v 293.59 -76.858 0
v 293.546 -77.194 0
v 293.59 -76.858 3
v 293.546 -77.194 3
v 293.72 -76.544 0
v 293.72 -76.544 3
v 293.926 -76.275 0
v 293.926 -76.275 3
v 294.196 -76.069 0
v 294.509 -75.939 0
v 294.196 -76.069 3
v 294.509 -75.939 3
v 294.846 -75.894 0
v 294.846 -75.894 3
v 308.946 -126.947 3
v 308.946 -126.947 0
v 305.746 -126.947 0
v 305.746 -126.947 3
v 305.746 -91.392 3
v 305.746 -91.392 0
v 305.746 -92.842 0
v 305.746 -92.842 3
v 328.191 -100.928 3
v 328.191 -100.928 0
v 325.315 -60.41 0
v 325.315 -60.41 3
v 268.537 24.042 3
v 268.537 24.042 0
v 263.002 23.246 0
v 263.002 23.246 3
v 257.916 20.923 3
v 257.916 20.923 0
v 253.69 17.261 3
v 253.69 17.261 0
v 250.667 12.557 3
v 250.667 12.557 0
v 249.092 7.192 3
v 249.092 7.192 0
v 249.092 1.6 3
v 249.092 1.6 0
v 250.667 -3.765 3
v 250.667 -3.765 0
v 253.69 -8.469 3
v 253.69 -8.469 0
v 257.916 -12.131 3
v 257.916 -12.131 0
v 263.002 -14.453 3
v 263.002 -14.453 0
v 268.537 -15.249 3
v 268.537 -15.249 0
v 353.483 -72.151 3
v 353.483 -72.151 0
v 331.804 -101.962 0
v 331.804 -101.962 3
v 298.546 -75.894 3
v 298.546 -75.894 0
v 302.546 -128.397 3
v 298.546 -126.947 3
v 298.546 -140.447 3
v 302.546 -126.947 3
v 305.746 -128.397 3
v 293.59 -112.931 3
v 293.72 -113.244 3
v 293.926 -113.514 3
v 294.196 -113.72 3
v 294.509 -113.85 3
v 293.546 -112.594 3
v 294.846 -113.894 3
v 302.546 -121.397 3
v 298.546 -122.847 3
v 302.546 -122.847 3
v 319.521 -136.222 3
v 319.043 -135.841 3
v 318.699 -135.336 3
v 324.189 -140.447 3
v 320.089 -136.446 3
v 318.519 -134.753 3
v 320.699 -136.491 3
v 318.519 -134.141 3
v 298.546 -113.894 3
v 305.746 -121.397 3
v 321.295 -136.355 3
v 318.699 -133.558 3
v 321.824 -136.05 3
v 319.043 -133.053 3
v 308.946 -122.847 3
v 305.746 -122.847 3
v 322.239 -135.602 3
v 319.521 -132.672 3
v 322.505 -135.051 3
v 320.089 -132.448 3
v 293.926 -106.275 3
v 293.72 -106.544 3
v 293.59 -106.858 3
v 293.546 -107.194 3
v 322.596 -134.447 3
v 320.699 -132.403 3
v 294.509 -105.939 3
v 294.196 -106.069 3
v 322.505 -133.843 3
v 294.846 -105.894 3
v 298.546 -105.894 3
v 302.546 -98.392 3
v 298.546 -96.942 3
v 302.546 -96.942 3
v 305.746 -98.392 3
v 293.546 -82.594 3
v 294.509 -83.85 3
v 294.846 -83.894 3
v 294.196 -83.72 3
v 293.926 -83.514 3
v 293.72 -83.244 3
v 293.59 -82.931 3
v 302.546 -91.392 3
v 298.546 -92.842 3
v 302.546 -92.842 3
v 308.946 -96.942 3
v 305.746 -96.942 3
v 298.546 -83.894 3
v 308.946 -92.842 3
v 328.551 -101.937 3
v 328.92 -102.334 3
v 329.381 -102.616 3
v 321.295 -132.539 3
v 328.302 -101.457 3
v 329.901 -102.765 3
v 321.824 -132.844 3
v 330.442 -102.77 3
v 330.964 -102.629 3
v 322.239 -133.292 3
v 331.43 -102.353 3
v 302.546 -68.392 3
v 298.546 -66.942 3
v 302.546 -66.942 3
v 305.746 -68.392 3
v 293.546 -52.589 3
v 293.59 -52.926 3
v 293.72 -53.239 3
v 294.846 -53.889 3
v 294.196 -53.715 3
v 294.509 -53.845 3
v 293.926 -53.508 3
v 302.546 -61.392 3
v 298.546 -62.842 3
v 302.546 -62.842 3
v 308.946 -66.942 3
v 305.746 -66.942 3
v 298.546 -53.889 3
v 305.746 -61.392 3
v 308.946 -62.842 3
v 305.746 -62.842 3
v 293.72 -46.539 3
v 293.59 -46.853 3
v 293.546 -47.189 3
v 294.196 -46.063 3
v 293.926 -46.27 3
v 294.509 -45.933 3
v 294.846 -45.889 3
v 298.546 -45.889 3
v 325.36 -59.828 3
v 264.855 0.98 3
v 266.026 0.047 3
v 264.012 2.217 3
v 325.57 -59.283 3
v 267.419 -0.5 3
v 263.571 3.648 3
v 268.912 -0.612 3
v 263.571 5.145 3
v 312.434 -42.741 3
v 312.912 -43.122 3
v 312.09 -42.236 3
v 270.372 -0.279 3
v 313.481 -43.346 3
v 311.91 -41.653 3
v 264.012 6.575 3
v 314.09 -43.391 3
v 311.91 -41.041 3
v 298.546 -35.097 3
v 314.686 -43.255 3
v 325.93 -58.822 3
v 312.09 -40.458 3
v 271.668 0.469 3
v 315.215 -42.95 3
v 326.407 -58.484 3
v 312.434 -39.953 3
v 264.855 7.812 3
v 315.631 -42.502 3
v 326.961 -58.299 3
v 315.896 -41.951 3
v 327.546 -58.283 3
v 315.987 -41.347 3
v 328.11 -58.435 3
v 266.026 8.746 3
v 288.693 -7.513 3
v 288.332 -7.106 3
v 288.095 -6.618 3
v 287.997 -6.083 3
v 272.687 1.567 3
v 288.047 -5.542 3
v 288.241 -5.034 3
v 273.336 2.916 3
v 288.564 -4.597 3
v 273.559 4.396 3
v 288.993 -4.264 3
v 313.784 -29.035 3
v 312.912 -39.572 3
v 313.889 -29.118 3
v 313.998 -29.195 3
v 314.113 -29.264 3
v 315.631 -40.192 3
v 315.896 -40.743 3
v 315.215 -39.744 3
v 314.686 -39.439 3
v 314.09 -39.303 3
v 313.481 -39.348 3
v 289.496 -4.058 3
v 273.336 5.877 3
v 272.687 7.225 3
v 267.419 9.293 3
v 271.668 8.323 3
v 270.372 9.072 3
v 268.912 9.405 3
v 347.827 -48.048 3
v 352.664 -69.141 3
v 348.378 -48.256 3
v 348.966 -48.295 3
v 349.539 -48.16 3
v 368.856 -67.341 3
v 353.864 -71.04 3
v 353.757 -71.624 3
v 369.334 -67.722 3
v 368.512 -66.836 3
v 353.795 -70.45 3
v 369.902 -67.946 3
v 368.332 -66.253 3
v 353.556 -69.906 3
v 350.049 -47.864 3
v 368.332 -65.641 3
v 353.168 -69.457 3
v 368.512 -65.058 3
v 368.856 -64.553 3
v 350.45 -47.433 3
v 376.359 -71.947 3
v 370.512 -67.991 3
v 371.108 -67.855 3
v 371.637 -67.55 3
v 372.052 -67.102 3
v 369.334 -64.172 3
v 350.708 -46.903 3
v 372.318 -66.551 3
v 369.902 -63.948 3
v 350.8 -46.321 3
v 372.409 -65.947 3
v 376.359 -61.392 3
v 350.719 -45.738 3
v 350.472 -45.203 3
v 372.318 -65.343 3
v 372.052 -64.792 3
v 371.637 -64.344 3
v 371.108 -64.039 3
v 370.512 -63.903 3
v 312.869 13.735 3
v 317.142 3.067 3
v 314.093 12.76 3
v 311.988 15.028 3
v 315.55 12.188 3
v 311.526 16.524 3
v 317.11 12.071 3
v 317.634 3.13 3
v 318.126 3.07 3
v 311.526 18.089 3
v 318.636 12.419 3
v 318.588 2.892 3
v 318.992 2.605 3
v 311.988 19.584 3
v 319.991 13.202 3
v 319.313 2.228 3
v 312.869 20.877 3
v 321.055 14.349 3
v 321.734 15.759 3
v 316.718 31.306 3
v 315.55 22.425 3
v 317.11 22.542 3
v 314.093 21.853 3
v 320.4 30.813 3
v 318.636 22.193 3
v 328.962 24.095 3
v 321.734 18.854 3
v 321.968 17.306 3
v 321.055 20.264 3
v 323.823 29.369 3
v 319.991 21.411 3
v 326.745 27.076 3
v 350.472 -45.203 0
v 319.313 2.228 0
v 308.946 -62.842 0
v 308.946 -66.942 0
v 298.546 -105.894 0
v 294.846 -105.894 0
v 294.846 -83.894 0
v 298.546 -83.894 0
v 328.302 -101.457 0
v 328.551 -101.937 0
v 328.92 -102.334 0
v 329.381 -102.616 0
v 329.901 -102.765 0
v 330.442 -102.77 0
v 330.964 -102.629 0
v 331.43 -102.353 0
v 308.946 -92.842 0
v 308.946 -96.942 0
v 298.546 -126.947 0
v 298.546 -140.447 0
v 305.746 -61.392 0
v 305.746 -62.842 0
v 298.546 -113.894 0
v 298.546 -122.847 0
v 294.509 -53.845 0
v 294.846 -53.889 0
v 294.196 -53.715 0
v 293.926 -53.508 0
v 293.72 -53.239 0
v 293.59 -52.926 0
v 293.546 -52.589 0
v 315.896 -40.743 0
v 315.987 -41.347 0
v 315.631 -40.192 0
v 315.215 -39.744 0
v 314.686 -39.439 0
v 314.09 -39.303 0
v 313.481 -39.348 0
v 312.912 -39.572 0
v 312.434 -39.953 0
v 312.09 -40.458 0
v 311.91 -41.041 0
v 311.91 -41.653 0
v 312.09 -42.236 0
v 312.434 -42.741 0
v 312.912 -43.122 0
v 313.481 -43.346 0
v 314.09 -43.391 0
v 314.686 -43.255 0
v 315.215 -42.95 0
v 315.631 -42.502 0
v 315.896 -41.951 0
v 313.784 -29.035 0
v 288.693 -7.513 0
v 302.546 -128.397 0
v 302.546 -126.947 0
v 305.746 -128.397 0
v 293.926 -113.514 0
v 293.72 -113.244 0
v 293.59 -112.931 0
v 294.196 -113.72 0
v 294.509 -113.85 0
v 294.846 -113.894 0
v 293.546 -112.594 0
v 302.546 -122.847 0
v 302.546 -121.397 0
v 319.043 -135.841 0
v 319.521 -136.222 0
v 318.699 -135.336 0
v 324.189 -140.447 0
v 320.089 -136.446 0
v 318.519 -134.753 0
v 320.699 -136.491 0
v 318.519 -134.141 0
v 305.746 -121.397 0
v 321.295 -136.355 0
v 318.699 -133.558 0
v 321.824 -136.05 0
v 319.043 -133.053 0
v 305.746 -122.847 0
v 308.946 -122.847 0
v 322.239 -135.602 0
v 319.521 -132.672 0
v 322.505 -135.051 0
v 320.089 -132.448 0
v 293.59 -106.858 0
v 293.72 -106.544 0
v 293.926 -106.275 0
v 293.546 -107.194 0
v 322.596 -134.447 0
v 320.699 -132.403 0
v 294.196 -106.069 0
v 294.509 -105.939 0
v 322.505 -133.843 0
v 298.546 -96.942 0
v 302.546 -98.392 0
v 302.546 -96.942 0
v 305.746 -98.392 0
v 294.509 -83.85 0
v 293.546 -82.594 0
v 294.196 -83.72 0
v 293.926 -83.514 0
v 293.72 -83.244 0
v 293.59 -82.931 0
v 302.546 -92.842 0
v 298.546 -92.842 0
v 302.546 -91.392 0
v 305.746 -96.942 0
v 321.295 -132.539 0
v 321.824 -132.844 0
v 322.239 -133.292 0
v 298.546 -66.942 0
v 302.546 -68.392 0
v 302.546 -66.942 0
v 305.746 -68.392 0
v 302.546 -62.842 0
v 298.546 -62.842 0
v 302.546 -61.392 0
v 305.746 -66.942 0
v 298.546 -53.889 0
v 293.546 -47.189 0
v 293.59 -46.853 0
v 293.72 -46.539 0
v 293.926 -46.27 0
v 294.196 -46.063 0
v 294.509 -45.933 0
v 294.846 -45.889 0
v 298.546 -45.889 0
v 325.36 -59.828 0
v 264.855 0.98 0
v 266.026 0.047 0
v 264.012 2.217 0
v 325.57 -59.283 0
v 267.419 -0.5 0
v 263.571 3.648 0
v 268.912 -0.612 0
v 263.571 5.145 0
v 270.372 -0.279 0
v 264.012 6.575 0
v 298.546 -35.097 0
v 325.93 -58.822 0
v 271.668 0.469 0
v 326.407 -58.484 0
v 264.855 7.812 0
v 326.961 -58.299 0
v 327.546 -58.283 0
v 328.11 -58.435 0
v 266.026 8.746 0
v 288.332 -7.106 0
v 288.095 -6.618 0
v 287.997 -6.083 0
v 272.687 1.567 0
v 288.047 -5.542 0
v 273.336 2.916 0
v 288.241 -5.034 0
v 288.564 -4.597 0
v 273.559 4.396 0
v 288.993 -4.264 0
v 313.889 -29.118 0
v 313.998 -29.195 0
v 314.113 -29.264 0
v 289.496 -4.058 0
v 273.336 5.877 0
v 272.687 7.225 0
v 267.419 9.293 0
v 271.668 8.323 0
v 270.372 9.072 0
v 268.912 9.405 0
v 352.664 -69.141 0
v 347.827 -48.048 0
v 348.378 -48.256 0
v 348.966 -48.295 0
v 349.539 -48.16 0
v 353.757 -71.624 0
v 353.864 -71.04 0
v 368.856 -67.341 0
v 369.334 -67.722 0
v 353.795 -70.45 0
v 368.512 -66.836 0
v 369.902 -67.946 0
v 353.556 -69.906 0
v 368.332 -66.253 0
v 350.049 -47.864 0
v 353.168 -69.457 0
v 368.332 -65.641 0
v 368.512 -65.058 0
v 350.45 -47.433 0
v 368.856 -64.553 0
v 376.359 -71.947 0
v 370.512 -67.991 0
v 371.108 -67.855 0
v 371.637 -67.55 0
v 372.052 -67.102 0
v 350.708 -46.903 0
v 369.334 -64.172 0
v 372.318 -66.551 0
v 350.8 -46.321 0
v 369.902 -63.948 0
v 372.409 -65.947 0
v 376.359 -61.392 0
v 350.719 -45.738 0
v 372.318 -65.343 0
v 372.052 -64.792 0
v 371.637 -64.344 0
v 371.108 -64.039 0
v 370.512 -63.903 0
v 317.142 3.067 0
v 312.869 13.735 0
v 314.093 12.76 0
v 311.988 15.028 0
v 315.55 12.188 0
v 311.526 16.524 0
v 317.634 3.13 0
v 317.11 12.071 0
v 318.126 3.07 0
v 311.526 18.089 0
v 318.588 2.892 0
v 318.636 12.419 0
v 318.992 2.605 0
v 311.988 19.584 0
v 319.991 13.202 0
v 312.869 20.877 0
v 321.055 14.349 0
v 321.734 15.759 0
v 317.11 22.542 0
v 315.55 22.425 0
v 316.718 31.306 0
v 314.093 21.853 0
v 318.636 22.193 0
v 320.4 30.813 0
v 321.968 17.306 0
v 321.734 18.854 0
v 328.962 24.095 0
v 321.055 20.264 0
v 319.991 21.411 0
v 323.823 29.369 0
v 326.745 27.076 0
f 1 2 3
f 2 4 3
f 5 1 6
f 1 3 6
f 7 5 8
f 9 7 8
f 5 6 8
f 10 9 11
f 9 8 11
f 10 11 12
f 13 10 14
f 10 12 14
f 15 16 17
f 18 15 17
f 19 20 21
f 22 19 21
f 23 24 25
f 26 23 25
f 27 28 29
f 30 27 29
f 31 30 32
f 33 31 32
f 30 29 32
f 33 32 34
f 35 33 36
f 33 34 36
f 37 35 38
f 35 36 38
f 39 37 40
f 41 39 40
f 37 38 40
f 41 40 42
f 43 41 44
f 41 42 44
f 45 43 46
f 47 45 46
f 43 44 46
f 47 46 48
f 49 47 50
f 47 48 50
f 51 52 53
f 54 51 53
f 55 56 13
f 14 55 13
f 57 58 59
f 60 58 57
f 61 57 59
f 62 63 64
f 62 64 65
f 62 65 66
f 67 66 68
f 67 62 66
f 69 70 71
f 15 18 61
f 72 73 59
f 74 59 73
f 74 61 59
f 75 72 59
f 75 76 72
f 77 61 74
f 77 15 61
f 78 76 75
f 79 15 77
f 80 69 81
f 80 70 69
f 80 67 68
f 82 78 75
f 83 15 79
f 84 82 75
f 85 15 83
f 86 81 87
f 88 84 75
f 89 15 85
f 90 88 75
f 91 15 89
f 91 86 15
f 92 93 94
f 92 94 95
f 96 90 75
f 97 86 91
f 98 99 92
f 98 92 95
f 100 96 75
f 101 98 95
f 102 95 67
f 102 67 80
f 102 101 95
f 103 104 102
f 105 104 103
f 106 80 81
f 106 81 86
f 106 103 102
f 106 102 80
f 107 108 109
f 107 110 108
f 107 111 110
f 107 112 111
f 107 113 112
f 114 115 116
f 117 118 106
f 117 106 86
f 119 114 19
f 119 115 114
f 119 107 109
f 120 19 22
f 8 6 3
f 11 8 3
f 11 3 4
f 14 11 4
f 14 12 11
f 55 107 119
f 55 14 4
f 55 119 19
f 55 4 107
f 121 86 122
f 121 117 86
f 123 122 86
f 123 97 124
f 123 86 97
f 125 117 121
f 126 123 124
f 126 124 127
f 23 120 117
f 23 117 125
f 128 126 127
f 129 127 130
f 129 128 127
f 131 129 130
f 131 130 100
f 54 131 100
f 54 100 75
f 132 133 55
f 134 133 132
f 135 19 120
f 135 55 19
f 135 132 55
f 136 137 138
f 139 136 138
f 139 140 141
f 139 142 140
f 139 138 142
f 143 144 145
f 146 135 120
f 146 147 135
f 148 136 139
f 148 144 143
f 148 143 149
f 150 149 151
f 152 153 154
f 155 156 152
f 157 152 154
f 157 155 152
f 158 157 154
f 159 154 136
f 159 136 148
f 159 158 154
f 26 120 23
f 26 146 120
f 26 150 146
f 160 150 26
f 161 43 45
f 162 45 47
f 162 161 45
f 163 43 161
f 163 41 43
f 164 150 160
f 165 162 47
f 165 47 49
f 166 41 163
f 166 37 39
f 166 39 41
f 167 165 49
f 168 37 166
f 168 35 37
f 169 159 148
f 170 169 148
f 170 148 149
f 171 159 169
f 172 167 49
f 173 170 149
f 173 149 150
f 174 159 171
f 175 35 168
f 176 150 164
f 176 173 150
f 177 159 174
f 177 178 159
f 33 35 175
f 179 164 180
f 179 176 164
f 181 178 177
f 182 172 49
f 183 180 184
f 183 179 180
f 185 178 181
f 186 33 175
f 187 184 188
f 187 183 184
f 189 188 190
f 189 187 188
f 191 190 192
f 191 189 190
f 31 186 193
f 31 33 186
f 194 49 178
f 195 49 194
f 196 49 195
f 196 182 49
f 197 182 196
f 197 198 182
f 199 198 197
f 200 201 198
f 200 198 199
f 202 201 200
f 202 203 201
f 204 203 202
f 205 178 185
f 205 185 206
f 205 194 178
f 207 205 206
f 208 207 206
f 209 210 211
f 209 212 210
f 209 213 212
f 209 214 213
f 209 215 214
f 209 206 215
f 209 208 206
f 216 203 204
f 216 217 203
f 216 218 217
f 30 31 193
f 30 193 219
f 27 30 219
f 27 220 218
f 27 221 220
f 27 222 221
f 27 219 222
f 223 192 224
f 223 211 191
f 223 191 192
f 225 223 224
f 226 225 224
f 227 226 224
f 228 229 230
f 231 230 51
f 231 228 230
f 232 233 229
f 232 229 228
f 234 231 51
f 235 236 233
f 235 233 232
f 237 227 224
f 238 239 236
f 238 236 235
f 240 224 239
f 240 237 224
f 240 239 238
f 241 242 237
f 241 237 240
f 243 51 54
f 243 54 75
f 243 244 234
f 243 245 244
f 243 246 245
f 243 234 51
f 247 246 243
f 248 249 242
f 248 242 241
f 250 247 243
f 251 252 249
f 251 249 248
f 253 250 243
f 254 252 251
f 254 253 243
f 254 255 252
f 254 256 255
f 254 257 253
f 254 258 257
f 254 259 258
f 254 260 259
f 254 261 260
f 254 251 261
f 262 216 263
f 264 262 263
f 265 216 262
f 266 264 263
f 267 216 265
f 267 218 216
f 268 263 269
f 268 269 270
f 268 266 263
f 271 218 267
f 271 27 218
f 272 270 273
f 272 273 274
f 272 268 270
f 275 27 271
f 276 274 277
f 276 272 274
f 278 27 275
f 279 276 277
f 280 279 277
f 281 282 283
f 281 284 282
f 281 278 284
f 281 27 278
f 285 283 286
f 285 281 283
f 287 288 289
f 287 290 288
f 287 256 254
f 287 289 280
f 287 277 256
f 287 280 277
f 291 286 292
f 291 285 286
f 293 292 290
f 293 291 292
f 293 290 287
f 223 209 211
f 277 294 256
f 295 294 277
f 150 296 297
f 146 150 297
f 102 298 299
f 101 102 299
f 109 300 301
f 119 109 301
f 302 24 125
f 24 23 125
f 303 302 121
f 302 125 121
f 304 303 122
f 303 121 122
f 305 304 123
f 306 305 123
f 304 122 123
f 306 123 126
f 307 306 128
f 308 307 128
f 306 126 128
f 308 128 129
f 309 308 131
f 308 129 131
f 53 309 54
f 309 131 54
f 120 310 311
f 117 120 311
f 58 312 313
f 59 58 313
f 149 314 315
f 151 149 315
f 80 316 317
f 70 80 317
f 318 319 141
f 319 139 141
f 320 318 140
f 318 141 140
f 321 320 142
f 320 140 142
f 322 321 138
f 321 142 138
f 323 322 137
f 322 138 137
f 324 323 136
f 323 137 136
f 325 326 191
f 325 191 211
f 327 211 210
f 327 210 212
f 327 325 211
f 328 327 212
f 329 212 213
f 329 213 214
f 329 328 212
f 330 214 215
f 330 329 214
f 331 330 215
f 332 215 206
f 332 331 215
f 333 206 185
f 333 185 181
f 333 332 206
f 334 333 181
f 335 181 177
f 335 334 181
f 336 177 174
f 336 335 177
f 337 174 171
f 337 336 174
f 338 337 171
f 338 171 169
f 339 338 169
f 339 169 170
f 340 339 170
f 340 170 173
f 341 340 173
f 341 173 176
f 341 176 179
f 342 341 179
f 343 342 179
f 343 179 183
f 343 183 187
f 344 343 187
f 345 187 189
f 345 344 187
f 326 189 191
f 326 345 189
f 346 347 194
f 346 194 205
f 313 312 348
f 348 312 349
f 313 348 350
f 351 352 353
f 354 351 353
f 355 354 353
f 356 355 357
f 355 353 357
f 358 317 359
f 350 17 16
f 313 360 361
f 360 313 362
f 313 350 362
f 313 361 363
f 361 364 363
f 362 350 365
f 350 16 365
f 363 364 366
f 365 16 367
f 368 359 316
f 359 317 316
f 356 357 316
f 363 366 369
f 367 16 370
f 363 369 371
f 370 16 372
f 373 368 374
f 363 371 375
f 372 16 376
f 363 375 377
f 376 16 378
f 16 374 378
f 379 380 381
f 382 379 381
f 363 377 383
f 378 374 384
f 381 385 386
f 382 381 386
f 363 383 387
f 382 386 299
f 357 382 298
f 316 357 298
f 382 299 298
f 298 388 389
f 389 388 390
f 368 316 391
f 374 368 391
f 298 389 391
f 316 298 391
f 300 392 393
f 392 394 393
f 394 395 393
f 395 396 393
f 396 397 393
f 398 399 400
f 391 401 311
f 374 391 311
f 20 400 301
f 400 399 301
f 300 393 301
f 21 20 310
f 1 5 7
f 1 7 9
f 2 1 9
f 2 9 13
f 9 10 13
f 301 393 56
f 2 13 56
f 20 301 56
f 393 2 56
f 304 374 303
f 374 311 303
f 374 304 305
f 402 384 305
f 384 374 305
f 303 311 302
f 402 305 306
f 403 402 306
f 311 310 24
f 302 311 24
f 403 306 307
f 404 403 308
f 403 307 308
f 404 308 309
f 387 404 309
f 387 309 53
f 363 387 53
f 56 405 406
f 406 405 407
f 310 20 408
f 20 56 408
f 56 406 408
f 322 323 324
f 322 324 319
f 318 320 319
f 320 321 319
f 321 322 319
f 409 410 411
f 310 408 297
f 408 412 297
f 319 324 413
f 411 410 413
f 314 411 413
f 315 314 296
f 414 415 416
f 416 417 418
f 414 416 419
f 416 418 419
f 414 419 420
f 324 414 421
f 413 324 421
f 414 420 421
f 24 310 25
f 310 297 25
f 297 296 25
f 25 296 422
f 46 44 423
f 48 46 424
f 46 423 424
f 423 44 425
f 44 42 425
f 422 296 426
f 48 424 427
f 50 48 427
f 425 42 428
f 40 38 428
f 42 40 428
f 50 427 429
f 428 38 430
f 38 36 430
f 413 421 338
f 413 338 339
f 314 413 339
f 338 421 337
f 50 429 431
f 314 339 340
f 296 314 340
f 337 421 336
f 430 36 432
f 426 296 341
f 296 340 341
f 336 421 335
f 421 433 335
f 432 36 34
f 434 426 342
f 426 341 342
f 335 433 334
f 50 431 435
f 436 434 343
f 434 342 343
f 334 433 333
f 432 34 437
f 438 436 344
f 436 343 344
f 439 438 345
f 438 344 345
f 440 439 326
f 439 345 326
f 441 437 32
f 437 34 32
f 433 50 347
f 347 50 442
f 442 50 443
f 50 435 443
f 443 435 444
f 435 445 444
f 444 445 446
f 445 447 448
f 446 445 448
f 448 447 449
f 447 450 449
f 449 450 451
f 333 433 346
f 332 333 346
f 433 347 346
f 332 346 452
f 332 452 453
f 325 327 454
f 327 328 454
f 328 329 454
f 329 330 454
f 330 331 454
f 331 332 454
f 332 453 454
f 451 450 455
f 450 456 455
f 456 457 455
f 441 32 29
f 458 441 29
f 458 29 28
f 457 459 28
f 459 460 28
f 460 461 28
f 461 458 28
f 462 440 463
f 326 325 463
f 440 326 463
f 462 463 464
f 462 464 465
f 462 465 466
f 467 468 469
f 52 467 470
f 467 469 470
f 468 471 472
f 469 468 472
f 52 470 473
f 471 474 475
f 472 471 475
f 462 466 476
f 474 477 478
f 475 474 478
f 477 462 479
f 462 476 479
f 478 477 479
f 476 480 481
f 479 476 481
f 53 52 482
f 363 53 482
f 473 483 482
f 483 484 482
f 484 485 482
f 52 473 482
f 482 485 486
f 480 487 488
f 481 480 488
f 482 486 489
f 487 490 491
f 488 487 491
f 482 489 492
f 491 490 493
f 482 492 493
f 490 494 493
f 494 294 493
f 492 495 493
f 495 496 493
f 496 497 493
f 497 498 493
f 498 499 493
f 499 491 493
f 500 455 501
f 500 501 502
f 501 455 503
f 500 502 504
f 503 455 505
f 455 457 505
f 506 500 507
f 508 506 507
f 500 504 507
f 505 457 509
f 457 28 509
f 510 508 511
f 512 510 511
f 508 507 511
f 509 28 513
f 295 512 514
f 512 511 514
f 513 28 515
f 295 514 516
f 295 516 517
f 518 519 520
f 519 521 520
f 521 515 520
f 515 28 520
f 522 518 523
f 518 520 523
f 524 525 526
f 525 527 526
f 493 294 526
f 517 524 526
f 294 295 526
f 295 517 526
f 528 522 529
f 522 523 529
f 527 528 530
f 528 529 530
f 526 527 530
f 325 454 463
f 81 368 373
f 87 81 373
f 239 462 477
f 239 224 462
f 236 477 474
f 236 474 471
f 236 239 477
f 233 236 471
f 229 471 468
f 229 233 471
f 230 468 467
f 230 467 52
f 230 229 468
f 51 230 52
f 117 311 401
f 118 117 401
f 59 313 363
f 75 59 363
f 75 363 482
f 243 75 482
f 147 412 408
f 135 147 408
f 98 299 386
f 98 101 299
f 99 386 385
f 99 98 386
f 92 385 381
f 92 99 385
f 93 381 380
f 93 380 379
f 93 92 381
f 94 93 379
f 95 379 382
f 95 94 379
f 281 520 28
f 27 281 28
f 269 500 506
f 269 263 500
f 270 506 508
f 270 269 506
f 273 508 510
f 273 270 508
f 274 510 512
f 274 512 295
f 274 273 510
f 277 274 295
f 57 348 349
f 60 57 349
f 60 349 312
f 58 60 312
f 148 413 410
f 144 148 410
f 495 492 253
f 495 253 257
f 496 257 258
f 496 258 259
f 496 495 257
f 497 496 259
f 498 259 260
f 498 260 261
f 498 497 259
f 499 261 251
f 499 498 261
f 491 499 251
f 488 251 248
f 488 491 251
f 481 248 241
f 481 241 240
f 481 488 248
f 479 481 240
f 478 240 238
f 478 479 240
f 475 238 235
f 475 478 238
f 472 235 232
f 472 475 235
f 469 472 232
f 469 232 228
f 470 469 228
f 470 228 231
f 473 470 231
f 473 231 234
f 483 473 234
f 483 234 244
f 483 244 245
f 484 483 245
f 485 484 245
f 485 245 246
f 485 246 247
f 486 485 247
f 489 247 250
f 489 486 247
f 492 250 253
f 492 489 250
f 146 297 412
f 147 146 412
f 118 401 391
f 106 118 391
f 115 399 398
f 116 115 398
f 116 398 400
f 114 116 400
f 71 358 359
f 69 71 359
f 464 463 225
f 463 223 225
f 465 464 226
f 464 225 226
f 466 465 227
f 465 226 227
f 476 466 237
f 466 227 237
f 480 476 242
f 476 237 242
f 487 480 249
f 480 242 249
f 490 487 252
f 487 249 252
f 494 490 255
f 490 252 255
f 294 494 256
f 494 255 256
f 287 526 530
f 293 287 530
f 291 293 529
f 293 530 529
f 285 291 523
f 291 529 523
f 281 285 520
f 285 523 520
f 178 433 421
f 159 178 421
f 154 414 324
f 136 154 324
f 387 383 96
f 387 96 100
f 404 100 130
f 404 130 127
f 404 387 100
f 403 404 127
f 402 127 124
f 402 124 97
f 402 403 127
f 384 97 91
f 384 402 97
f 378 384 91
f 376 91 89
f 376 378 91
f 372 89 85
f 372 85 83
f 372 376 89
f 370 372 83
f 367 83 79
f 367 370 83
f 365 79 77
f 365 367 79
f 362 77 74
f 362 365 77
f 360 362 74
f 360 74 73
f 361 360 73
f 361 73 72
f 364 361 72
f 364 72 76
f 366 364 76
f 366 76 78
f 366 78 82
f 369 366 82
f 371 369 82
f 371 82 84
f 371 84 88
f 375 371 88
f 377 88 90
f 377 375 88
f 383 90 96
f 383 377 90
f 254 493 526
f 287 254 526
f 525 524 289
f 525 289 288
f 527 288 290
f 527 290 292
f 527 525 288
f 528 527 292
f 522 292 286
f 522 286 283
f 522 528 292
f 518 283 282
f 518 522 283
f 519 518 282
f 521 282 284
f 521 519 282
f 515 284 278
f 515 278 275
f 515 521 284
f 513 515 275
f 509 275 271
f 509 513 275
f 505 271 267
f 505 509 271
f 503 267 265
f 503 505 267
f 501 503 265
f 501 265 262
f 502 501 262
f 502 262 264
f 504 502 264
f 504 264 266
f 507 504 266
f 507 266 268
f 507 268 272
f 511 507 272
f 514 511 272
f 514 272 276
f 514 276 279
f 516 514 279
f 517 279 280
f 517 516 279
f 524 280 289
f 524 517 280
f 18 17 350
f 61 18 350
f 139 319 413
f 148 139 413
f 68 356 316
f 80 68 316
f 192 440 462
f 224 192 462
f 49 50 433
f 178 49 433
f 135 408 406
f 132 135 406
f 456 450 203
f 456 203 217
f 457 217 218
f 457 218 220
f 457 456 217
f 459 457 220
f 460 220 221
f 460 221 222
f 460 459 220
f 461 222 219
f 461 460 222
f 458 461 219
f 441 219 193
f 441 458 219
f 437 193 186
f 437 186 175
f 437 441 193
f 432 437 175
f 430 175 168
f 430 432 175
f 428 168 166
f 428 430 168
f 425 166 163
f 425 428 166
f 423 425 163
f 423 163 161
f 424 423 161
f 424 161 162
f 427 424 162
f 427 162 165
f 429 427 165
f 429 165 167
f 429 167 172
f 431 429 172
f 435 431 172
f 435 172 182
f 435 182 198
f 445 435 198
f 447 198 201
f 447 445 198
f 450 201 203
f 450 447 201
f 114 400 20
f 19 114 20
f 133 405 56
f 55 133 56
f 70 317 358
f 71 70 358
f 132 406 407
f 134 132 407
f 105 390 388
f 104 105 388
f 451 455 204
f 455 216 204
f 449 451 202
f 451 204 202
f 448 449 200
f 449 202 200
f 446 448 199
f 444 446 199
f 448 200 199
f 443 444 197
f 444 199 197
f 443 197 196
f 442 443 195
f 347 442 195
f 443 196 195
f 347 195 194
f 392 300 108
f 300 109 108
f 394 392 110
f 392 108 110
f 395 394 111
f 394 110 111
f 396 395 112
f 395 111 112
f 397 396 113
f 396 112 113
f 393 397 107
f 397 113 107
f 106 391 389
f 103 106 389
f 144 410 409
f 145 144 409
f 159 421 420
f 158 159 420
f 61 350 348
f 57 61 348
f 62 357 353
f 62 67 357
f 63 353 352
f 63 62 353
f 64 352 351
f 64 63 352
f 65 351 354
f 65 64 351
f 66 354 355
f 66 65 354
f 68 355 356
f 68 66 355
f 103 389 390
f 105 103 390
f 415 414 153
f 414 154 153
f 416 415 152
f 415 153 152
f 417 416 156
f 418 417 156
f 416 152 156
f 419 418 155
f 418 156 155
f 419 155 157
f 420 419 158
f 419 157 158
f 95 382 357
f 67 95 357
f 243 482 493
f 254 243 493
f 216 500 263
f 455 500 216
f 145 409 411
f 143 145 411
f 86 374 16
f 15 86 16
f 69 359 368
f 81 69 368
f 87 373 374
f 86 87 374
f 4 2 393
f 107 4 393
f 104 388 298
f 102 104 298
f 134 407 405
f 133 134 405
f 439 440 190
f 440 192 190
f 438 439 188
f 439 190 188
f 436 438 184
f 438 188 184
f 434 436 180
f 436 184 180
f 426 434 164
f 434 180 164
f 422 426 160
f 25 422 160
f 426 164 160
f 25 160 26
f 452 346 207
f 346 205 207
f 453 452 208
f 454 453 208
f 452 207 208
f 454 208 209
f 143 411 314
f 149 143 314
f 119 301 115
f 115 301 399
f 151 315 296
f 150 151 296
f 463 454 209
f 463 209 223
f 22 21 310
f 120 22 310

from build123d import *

# Parameters (mm, degrees)
SKETCH_1_R      = 5.0225
SKETCH_1_R_2    = 2.05
SKETCH_1_R_3    = 5.25
EXTRUDE_1_DEPTH = 3
FILLET_1_R      = 2
FILLET_2_R      = 1.3


with BuildPart() as part:
    # 草图1 → 凸台-拉伸1 (new body)
    with BuildSketch(Plane.XY):
        with BuildLine():
            Line((298.545628784, -83.894391363), (298.545628784, -92.841778663))
            Line((298.545628784, -92.841778663), (302.545628784, -92.841778663))
            Line((302.545628784, -92.841778663), (302.545628784, -91.391778663))
            Line((302.545628784, -91.391778663), (305.745628784, -91.391778663))
            Line((305.745628784, -91.391778663), (305.745628784, -92.841778663))
            Line((305.745628784, -92.841778663), (308.945628784, -92.841778663))
            Line((308.945628784, -92.841778663), (308.945628784, -96.941778663))
            Line((308.945628784, -96.941778663), (305.745628784, -96.941778663))
            Line((305.745628784, -96.941778663), (305.745628784, -98.391778663))
            Line((305.745628784, -98.391778663), (302.545628784, -98.391778663))
            Line((302.545628784, -98.391778663), (302.545628784, -96.941778663))
            Line((302.545628784, -96.941778663), (298.545628784, -96.941778663))
            Line((298.545628784, -96.941778663), (298.545628784, -105.894391358))
            Line((298.545628784, -105.894391358), (293.545628784, -105.894391358))
            Line((293.545628784, -105.894391358), (293.545628784, -113.894391358))
            Line((293.545628784, -113.894391358), (298.545628784, -113.894391358))
            Line((298.545628784, -113.894391358), (298.545628784, -122.847004054))
            Line((298.545628784, -122.847004054), (302.545628784, -122.847004054))
            Line((302.545628784, -122.847004054), (302.545628784, -121.397004054))
            Line((302.545628784, -121.397004054), (305.745628784, -121.397004054))
            Line((305.745628784, -121.397004054), (305.745628784, -122.847004054))
            Line((305.745628784, -122.847004054), (308.945628784, -122.847004054))
            Line((308.945628784, -122.847004054), (308.945628784, -126.947004054))
            Line((308.945628784, -126.947004054), (305.745628784, -126.947004054))
            Line((305.745628784, -126.947004054), (305.745628784, -128.397004054))
            Line((305.745628784, -128.397004054), (302.545628784, -128.397004054))
            Line((302.545628784, -128.397004054), (302.545628784, -126.947004054))
            Line((302.545628784, -126.947004054), (298.545628784, -126.947004054))
            Line((298.545628784, -126.947004054), (298.545628784, -140.447004054))
            Line((298.545628784, -140.447004054), (324.188862368, -140.447004054))
            Line((324.188862368, -140.447004054), (376.358604426, -71.946984141))
            Line((376.358604426, -71.946984141), (376.358604426, -61.391778668))
            Line((376.358604426, -61.391778668), (328.961754808, 24.094724856))
            ThreePointArc((328.961754808, 24.094724856), (323.822689813, 29.369350164), (316.717741365, 31.306195206))
            Line((316.717741365, 31.306195206), (268.536959304, 24.041593685))
            ThreePointArc((268.536959304, 24.041593685), (248.891566772, 4.396186988), (268.536987634, -15.249191379))
            Line((268.536987634, -15.249191379), (298.545628784, -35.096984141))
            Line((298.545628784, -35.096984141), (298.545628784, -45.889165972))
            Line((298.545628784, -45.889165972), (293.545628784, -45.889165972))
            Line((293.545628784, -45.889165972), (293.545628784, -53.889165972))
            Line((293.545628784, -53.889165972), (298.545628784, -53.889165972))
            Line((298.545628784, -53.889165972), (298.545628784, -62.841778668))
            Line((298.545628784, -62.841778668), (302.545628784, -62.841778668))
            Line((302.545628784, -62.841778668), (302.545628784, -61.391778668))
            Line((302.545628784, -61.391778668), (305.745628784, -61.391778668))
            Line((305.745628784, -61.391778668), (305.745628784, -62.841778668))
            Line((305.745628784, -62.841778668), (308.945628784, -62.841778668))
            Line((308.945628784, -62.841778668), (308.945628784, -66.941778668))
            Line((308.945628784, -66.941778668), (305.745628784, -66.941778668))
            Line((305.745628784, -66.941778668), (305.745628784, -68.391778668))
            Line((305.745628784, -68.391778668), (302.545628784, -68.391778668))
            Line((302.545628784, -68.391778668), (302.545628784, -66.941778668))
            Line((302.545628784, -66.941778668), (298.545628784, -66.941778668))
            Line((298.545628784, -66.941778668), (298.545628784, -75.894391363))
            Line((298.545628784, -75.894391363), (293.545628784, -75.894391363))
            Line((293.545628784, -75.894391363), (293.545628784, -83.894391363))
            Line((293.545628784, -83.894391363), (298.545628784, -83.894391363))
        make_face()
        with Locations((268.536959304, 4.396201153)):
            Circle(SKETCH_1_R, mode=Mode.SUBTRACT)
        with Locations((320.545628784, -134.447004054)):
            Circle(SKETCH_1_R_2, mode=Mode.SUBTRACT)
        with Locations((370.358604426, -65.946984141)):
            Circle(SKETCH_1_R_2, mode=Mode.SUBTRACT)
        with Locations((313.936987634, -41.346984141)):
            Circle(SKETCH_1_R_2, mode=Mode.SUBTRACT)
        with Locations((316.717741365, 17.306195206)):
            Circle(SKETCH_1_R_3, mode=Mode.SUBTRACT)
        Polygon((354.947285032, -70.136765586), (328.579617375, -106.396108383), (325.08144343, -57.115165973), align=None, mode=Mode.SUBTRACT)
        Polygon((318.527528456, 3.423664072), (285.781281912, -5.015216674), (313.936947803, -29.165661305), (354.9472452, -52.015830841), align=None, mode=Mode.SUBTRACT)
    extrude(amount=EXTRUDE_1_DEPTH)

    # 圆角1
    fillet_1_edges = [part.edges().sort_by_distance(p)[0] for p in [
        (354.9472452, -52.015830841, 1.5),
        (318.527528456, 3.423664072, 1.5),
        (285.781281912, -5.015216674, 1.5),
        (313.936947803, -29.165661305, 1.5),
        (354.947285032, -70.136765586, 1.5),
        (325.08144343, -57.115165973, 1.5),
        (328.579617375, -106.396108383, 1.5),
    ]]
    fillet(fillet_1_edges, radius=FILLET_1_R)

    # 圆角2
    fillet_2_edges = [part.edges().sort_by_distance(p)[0] for p in [
        (293.545628784, -83.894391363, 1.5),
        (293.545628784, -75.894391363, 1.5),
        (293.545628784, -53.889165972, 1.5),
        (293.545628784, -45.889165972, 1.5),
        (293.545628784, -113.894391358, 1.5),
        (293.545628784, -105.894391358, 1.5),
    ]]
    fillet(fillet_2_edges, radius=FILLET_2_R)


solid = part.part
